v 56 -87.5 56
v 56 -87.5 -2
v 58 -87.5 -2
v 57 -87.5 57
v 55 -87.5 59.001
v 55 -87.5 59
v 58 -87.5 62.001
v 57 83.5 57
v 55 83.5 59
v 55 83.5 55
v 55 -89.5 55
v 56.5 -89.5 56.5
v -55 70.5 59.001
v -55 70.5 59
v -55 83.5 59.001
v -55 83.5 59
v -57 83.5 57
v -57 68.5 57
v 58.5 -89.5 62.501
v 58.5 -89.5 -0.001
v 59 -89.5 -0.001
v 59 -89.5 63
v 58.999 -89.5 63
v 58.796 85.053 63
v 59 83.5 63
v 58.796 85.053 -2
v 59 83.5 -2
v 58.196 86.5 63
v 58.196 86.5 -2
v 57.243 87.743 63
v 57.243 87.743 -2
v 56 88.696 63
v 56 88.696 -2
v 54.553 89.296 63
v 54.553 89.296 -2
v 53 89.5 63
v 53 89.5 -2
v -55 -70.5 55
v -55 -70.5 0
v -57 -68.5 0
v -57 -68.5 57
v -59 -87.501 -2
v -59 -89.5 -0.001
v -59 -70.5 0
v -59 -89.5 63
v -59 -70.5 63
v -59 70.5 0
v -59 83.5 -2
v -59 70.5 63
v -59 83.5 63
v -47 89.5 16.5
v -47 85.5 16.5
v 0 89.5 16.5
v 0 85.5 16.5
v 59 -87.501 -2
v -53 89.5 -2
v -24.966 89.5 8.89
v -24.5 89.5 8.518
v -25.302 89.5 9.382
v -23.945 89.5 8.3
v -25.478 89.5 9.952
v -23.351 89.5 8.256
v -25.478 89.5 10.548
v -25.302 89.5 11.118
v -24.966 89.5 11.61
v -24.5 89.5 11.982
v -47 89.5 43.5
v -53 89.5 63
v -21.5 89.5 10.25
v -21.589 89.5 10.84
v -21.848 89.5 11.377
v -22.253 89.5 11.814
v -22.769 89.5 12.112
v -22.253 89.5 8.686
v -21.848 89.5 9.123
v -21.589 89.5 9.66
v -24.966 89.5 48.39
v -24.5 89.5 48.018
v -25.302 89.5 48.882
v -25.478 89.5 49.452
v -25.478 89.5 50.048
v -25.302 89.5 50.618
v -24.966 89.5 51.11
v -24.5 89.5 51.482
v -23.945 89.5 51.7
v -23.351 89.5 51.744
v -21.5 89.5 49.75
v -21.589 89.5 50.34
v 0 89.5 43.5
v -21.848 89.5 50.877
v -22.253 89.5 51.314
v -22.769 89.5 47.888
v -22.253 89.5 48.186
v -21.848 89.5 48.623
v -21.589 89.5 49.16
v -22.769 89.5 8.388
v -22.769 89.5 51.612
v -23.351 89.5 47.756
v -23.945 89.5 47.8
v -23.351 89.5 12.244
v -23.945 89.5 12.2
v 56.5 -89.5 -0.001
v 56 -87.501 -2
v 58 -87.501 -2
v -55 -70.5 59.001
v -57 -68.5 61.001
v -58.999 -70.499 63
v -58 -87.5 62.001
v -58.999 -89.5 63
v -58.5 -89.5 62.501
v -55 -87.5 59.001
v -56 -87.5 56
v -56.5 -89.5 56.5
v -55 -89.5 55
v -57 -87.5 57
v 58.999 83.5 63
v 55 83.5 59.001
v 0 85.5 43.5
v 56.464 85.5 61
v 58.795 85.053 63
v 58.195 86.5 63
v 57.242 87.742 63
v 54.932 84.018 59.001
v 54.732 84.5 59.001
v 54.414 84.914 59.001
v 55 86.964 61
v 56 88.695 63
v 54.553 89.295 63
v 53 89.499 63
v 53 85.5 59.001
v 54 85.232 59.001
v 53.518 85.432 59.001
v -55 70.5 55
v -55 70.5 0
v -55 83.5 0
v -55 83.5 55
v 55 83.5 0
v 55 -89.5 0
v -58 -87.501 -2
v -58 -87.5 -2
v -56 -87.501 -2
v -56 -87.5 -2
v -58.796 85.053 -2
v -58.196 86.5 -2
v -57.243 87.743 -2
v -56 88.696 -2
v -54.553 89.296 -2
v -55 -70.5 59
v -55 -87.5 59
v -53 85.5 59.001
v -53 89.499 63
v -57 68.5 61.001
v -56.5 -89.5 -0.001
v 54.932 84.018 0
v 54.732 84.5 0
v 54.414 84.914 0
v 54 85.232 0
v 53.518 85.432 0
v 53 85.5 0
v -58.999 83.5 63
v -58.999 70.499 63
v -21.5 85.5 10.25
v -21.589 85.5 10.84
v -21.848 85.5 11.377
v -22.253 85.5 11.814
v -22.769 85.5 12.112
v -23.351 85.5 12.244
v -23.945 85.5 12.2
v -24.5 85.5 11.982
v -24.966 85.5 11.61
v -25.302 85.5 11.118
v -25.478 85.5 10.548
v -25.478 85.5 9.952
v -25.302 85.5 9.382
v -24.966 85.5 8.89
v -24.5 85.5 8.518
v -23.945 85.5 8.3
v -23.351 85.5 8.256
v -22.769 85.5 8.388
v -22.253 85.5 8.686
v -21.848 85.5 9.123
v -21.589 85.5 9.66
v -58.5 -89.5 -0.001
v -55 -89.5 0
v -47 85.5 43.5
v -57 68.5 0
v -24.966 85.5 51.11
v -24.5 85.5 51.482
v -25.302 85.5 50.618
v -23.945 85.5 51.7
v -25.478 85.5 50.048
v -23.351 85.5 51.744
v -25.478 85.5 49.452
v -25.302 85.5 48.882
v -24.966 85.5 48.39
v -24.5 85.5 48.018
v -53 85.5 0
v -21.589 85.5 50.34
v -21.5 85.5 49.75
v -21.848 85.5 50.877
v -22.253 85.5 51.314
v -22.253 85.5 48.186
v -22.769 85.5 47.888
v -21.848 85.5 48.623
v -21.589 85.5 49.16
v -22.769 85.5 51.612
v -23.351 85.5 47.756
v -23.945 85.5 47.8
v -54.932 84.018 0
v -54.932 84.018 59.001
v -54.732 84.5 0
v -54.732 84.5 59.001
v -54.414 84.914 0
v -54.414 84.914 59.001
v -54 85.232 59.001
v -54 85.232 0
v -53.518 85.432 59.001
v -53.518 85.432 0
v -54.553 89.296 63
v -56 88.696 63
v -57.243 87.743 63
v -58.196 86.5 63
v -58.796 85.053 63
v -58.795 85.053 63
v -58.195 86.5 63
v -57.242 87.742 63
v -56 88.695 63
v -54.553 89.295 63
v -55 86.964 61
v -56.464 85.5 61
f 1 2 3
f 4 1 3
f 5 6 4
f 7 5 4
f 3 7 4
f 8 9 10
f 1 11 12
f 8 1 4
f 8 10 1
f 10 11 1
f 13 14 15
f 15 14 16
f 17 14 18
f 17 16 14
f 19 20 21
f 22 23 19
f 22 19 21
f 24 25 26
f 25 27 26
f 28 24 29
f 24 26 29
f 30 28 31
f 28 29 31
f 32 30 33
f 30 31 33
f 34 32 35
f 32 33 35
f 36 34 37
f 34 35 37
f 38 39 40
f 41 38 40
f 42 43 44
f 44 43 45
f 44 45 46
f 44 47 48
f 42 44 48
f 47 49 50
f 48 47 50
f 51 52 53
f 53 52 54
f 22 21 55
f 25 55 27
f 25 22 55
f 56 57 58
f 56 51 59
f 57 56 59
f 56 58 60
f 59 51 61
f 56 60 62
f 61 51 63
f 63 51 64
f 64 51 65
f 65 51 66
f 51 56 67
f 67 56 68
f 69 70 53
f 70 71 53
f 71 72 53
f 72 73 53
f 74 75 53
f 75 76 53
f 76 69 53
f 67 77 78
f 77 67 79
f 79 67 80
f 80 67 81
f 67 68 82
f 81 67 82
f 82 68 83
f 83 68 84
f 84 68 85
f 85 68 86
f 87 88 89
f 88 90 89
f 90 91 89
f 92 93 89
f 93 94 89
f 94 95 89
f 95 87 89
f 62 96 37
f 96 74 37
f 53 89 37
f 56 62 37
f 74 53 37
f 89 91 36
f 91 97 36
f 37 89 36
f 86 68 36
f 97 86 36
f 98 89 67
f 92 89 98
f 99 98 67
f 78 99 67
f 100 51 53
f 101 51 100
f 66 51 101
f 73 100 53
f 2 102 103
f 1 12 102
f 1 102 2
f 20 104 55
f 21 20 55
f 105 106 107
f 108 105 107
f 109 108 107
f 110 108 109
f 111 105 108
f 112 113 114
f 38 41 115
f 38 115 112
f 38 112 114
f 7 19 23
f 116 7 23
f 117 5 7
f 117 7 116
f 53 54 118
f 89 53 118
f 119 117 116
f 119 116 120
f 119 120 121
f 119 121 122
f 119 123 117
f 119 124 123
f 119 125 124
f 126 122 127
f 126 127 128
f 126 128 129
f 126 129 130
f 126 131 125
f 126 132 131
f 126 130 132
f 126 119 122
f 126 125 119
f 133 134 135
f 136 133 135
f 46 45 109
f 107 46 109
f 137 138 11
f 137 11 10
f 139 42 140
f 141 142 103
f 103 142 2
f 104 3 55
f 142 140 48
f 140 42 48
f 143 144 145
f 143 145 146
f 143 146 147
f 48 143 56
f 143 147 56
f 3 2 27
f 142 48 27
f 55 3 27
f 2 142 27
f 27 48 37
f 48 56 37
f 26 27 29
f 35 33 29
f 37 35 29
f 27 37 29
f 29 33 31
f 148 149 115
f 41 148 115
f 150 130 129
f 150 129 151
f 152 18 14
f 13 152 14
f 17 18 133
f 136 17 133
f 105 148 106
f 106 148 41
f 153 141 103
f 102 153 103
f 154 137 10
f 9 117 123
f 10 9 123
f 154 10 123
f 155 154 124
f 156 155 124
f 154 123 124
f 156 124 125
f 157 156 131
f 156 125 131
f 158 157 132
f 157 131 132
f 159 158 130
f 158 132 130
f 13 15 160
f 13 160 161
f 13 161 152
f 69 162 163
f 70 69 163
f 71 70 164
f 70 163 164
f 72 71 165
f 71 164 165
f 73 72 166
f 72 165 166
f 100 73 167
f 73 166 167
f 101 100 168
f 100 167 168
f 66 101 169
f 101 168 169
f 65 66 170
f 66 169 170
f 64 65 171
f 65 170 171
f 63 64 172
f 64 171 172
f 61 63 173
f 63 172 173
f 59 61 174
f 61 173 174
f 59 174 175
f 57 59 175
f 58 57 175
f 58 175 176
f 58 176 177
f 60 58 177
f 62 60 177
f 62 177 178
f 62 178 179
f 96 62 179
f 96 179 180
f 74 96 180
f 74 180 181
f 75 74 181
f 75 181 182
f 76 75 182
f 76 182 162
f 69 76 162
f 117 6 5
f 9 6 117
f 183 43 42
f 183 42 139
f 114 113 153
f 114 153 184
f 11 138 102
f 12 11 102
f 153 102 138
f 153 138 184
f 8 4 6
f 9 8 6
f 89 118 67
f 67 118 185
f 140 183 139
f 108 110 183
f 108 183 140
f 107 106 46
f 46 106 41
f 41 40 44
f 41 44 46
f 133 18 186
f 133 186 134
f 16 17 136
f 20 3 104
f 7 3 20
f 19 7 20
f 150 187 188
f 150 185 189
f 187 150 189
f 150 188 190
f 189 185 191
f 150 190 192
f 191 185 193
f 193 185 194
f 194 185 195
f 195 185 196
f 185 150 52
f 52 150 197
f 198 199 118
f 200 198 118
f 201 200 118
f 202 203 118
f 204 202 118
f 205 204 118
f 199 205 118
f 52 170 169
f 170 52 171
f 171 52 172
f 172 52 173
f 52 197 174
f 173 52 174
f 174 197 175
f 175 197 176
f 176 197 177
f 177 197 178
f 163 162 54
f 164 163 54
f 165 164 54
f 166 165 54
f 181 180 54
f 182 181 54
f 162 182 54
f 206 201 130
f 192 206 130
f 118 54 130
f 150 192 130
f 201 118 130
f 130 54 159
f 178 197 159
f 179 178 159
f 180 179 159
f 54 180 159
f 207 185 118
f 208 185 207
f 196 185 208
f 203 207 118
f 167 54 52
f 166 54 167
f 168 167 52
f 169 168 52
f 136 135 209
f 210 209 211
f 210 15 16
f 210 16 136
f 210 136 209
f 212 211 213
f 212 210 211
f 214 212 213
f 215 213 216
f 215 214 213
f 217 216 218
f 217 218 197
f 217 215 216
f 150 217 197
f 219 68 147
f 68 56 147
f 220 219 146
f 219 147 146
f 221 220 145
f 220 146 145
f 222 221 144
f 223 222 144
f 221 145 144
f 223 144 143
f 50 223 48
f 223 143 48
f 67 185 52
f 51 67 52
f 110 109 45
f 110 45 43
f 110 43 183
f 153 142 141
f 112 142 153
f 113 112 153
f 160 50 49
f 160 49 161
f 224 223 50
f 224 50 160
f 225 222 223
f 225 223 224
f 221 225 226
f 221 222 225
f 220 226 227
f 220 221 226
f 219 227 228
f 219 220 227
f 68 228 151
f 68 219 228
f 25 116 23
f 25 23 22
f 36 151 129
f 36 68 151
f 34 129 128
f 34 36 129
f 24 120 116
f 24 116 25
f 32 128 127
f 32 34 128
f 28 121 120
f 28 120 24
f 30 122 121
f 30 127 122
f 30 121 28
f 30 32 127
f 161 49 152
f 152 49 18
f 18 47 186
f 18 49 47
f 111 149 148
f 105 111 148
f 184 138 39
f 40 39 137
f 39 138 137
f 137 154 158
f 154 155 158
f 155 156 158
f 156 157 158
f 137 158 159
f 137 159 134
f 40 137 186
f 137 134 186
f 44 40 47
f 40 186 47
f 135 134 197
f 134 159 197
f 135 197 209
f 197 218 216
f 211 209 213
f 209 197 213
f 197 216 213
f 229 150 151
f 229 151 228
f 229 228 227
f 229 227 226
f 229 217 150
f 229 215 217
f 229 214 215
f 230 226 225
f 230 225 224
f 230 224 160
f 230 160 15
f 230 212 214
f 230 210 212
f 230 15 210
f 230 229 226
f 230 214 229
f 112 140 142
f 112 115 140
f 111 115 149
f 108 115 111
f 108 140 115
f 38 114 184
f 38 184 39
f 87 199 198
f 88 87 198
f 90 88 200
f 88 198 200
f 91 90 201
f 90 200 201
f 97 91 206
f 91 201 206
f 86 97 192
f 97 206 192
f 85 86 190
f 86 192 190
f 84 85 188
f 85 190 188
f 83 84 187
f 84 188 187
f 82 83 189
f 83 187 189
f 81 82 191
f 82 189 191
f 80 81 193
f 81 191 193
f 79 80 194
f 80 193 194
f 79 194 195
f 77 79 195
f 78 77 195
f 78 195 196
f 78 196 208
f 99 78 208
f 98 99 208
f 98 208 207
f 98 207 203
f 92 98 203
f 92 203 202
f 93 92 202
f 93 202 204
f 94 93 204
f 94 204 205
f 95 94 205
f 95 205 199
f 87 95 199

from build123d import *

# Parameters (mm, degrees)
SKETCH_W             = 118
SKETCH_H             = 179
PAD_DEPTH            = 63
PAD_DEPTH_BACK       = 2
SKETCH001_W          = 110
SKETCH001_H          = 175
POCKET_DEPTH         = 63.001
FILLET_R             = 2
FILLET001_R          = 6
CHAMFER_SIZE         = 3.999
POCKET001_DEPTH      = 83.5
POCKET001_DEPTH_BACK = -1000
POCKET002_DEPTH      = 63.001
CHAMFER001_SIZE      = 1.999
POCKET003_DEPTH      = 2.001
POCKET003_DEPTH_BACK = -63.001
SKETCH006_W          = 2
SKETCH006_H          = 2
POCKET004_DEPTH      = 5
SKETCH007_R          = 2
POCKET005_DEPTH      = 89.501


with BuildPart() as part:
    # Sketch → Pad (new body, two sides)
    with BuildSketch(Plane.XY) as pad_sk:
        Rectangle(SKETCH_W, SKETCH_H)
    extrude(amount=PAD_DEPTH)
    extrude(pad_sk.sketch, amount=-PAD_DEPTH_BACK)

    # Sketch001 → Pocket (cut, through all)
    with BuildSketch(Plane.XY):
        with Locations((0, -2)):
            Rectangle(SKETCH001_W, SKETCH001_H)
    extrude(amount=POCKET_DEPTH, mode=Mode.SUBTRACT)

    # Fillet
    fillet_edges = [part.edges().sort_by_distance(p)[0] for p in [
        (55, 85.5, 31.5),
        (-55, 85.5, 31.5),
    ]]
    fillet(fillet_edges, radius=FILLET_R)

    # Fillet001
    fillet001_edges = [part.edges().sort_by_distance(p)[0] for p in [
        (-59, 89.5, 30.5),
        (59, 89.5, 30.5),
    ]]
    fillet(fillet001_edges, radius=FILLET001_R)

    # Chamfer
    chamfer_edges = [part.edges().sort_by_distance(p)[0] for p in [
        (-55, -3, 63),
    ]]
    chamfer(chamfer_edges, length=CHAMFER_SIZE)

    # Sketch003 → Pocket001 (cut, two sides)
    with BuildSketch(Plane.XZ) as pocket001_sk:
        Polygon((-55, 59), (-57, 57), (-55, 55), (55, 55), (57, 57), (55, 59), align=None)
    extrude(amount=-POCKET001_DEPTH, mode=Mode.SUBTRACT)
    extrude(pocket001_sk.sketch, amount=-POCKET001_DEPTH_BACK, mode=Mode.SUBTRACT)

    # Sketch004 → Pocket002 (cut, through all)
    with BuildSketch(Plane.XY):
        Polygon((-59, -70.5), (-59, 70.5), (-57, 68.5), (-55, 70.5), (-55, -70.5), (-57, -68.5), align=None)
    extrude(amount=POCKET002_DEPTH, mode=Mode.SUBTRACT)

    # Chamfer001
    chamfer001_edges = [part.edges().sort_by_distance(p)[0] for p in [
        (0, -89.5, -2),
    ]]
    chamfer(chamfer001_edges, length=CHAMFER001_SIZE)

    # Sketch005 → Pocket003 (cut, two sides)
    with BuildSketch(Plane.XY) as pocket003_sk:
        Polygon((-58.5, -89.5), (-58, -87.5), (-56, -87.5), (-56.5, -89.5), align=None)
        Polygon((58.5, -89.5), (56.5, -89.5), (56, -87.5), (58, -87.5), align=None)
    extrude(amount=-POCKET003_DEPTH, mode=Mode.SUBTRACT)
    extrude(pocket003_sk.sketch, amount=-POCKET003_DEPTH_BACK, mode=Mode.SUBTRACT)

    # Sketch006 (on DatumPlane) → Pocket004 (cut)
    with BuildSketch(Plane.XY.offset(57)):
        with Locations((-56, -88.5)):
            Rectangle(SKETCH006_W, SKETCH006_H)
        with Locations((56, -88.5)):
            Rectangle(SKETCH006_W, SKETCH006_H)
    extrude(amount=POCKET004_DEPTH, mode=Mode.SUBTRACT)

    # Sketch007 → Pocket005 (cut, through all)
    with BuildSketch(Plane.XZ):
        with Locations((-23.5, 10.25)):
            Circle(SKETCH007_R)
        with Locations((-23.5, 49.75)):
            Circle(SKETCH007_R)
        Polygon((0, 43.5), (-47, 43.5), (-47, 30), (-47, 16.5), (0, 16.5), (0, 30), align=None)
    extrude(amount=-POCKET005_DEPTH, mode=Mode.SUBTRACT)


solid = part.part
